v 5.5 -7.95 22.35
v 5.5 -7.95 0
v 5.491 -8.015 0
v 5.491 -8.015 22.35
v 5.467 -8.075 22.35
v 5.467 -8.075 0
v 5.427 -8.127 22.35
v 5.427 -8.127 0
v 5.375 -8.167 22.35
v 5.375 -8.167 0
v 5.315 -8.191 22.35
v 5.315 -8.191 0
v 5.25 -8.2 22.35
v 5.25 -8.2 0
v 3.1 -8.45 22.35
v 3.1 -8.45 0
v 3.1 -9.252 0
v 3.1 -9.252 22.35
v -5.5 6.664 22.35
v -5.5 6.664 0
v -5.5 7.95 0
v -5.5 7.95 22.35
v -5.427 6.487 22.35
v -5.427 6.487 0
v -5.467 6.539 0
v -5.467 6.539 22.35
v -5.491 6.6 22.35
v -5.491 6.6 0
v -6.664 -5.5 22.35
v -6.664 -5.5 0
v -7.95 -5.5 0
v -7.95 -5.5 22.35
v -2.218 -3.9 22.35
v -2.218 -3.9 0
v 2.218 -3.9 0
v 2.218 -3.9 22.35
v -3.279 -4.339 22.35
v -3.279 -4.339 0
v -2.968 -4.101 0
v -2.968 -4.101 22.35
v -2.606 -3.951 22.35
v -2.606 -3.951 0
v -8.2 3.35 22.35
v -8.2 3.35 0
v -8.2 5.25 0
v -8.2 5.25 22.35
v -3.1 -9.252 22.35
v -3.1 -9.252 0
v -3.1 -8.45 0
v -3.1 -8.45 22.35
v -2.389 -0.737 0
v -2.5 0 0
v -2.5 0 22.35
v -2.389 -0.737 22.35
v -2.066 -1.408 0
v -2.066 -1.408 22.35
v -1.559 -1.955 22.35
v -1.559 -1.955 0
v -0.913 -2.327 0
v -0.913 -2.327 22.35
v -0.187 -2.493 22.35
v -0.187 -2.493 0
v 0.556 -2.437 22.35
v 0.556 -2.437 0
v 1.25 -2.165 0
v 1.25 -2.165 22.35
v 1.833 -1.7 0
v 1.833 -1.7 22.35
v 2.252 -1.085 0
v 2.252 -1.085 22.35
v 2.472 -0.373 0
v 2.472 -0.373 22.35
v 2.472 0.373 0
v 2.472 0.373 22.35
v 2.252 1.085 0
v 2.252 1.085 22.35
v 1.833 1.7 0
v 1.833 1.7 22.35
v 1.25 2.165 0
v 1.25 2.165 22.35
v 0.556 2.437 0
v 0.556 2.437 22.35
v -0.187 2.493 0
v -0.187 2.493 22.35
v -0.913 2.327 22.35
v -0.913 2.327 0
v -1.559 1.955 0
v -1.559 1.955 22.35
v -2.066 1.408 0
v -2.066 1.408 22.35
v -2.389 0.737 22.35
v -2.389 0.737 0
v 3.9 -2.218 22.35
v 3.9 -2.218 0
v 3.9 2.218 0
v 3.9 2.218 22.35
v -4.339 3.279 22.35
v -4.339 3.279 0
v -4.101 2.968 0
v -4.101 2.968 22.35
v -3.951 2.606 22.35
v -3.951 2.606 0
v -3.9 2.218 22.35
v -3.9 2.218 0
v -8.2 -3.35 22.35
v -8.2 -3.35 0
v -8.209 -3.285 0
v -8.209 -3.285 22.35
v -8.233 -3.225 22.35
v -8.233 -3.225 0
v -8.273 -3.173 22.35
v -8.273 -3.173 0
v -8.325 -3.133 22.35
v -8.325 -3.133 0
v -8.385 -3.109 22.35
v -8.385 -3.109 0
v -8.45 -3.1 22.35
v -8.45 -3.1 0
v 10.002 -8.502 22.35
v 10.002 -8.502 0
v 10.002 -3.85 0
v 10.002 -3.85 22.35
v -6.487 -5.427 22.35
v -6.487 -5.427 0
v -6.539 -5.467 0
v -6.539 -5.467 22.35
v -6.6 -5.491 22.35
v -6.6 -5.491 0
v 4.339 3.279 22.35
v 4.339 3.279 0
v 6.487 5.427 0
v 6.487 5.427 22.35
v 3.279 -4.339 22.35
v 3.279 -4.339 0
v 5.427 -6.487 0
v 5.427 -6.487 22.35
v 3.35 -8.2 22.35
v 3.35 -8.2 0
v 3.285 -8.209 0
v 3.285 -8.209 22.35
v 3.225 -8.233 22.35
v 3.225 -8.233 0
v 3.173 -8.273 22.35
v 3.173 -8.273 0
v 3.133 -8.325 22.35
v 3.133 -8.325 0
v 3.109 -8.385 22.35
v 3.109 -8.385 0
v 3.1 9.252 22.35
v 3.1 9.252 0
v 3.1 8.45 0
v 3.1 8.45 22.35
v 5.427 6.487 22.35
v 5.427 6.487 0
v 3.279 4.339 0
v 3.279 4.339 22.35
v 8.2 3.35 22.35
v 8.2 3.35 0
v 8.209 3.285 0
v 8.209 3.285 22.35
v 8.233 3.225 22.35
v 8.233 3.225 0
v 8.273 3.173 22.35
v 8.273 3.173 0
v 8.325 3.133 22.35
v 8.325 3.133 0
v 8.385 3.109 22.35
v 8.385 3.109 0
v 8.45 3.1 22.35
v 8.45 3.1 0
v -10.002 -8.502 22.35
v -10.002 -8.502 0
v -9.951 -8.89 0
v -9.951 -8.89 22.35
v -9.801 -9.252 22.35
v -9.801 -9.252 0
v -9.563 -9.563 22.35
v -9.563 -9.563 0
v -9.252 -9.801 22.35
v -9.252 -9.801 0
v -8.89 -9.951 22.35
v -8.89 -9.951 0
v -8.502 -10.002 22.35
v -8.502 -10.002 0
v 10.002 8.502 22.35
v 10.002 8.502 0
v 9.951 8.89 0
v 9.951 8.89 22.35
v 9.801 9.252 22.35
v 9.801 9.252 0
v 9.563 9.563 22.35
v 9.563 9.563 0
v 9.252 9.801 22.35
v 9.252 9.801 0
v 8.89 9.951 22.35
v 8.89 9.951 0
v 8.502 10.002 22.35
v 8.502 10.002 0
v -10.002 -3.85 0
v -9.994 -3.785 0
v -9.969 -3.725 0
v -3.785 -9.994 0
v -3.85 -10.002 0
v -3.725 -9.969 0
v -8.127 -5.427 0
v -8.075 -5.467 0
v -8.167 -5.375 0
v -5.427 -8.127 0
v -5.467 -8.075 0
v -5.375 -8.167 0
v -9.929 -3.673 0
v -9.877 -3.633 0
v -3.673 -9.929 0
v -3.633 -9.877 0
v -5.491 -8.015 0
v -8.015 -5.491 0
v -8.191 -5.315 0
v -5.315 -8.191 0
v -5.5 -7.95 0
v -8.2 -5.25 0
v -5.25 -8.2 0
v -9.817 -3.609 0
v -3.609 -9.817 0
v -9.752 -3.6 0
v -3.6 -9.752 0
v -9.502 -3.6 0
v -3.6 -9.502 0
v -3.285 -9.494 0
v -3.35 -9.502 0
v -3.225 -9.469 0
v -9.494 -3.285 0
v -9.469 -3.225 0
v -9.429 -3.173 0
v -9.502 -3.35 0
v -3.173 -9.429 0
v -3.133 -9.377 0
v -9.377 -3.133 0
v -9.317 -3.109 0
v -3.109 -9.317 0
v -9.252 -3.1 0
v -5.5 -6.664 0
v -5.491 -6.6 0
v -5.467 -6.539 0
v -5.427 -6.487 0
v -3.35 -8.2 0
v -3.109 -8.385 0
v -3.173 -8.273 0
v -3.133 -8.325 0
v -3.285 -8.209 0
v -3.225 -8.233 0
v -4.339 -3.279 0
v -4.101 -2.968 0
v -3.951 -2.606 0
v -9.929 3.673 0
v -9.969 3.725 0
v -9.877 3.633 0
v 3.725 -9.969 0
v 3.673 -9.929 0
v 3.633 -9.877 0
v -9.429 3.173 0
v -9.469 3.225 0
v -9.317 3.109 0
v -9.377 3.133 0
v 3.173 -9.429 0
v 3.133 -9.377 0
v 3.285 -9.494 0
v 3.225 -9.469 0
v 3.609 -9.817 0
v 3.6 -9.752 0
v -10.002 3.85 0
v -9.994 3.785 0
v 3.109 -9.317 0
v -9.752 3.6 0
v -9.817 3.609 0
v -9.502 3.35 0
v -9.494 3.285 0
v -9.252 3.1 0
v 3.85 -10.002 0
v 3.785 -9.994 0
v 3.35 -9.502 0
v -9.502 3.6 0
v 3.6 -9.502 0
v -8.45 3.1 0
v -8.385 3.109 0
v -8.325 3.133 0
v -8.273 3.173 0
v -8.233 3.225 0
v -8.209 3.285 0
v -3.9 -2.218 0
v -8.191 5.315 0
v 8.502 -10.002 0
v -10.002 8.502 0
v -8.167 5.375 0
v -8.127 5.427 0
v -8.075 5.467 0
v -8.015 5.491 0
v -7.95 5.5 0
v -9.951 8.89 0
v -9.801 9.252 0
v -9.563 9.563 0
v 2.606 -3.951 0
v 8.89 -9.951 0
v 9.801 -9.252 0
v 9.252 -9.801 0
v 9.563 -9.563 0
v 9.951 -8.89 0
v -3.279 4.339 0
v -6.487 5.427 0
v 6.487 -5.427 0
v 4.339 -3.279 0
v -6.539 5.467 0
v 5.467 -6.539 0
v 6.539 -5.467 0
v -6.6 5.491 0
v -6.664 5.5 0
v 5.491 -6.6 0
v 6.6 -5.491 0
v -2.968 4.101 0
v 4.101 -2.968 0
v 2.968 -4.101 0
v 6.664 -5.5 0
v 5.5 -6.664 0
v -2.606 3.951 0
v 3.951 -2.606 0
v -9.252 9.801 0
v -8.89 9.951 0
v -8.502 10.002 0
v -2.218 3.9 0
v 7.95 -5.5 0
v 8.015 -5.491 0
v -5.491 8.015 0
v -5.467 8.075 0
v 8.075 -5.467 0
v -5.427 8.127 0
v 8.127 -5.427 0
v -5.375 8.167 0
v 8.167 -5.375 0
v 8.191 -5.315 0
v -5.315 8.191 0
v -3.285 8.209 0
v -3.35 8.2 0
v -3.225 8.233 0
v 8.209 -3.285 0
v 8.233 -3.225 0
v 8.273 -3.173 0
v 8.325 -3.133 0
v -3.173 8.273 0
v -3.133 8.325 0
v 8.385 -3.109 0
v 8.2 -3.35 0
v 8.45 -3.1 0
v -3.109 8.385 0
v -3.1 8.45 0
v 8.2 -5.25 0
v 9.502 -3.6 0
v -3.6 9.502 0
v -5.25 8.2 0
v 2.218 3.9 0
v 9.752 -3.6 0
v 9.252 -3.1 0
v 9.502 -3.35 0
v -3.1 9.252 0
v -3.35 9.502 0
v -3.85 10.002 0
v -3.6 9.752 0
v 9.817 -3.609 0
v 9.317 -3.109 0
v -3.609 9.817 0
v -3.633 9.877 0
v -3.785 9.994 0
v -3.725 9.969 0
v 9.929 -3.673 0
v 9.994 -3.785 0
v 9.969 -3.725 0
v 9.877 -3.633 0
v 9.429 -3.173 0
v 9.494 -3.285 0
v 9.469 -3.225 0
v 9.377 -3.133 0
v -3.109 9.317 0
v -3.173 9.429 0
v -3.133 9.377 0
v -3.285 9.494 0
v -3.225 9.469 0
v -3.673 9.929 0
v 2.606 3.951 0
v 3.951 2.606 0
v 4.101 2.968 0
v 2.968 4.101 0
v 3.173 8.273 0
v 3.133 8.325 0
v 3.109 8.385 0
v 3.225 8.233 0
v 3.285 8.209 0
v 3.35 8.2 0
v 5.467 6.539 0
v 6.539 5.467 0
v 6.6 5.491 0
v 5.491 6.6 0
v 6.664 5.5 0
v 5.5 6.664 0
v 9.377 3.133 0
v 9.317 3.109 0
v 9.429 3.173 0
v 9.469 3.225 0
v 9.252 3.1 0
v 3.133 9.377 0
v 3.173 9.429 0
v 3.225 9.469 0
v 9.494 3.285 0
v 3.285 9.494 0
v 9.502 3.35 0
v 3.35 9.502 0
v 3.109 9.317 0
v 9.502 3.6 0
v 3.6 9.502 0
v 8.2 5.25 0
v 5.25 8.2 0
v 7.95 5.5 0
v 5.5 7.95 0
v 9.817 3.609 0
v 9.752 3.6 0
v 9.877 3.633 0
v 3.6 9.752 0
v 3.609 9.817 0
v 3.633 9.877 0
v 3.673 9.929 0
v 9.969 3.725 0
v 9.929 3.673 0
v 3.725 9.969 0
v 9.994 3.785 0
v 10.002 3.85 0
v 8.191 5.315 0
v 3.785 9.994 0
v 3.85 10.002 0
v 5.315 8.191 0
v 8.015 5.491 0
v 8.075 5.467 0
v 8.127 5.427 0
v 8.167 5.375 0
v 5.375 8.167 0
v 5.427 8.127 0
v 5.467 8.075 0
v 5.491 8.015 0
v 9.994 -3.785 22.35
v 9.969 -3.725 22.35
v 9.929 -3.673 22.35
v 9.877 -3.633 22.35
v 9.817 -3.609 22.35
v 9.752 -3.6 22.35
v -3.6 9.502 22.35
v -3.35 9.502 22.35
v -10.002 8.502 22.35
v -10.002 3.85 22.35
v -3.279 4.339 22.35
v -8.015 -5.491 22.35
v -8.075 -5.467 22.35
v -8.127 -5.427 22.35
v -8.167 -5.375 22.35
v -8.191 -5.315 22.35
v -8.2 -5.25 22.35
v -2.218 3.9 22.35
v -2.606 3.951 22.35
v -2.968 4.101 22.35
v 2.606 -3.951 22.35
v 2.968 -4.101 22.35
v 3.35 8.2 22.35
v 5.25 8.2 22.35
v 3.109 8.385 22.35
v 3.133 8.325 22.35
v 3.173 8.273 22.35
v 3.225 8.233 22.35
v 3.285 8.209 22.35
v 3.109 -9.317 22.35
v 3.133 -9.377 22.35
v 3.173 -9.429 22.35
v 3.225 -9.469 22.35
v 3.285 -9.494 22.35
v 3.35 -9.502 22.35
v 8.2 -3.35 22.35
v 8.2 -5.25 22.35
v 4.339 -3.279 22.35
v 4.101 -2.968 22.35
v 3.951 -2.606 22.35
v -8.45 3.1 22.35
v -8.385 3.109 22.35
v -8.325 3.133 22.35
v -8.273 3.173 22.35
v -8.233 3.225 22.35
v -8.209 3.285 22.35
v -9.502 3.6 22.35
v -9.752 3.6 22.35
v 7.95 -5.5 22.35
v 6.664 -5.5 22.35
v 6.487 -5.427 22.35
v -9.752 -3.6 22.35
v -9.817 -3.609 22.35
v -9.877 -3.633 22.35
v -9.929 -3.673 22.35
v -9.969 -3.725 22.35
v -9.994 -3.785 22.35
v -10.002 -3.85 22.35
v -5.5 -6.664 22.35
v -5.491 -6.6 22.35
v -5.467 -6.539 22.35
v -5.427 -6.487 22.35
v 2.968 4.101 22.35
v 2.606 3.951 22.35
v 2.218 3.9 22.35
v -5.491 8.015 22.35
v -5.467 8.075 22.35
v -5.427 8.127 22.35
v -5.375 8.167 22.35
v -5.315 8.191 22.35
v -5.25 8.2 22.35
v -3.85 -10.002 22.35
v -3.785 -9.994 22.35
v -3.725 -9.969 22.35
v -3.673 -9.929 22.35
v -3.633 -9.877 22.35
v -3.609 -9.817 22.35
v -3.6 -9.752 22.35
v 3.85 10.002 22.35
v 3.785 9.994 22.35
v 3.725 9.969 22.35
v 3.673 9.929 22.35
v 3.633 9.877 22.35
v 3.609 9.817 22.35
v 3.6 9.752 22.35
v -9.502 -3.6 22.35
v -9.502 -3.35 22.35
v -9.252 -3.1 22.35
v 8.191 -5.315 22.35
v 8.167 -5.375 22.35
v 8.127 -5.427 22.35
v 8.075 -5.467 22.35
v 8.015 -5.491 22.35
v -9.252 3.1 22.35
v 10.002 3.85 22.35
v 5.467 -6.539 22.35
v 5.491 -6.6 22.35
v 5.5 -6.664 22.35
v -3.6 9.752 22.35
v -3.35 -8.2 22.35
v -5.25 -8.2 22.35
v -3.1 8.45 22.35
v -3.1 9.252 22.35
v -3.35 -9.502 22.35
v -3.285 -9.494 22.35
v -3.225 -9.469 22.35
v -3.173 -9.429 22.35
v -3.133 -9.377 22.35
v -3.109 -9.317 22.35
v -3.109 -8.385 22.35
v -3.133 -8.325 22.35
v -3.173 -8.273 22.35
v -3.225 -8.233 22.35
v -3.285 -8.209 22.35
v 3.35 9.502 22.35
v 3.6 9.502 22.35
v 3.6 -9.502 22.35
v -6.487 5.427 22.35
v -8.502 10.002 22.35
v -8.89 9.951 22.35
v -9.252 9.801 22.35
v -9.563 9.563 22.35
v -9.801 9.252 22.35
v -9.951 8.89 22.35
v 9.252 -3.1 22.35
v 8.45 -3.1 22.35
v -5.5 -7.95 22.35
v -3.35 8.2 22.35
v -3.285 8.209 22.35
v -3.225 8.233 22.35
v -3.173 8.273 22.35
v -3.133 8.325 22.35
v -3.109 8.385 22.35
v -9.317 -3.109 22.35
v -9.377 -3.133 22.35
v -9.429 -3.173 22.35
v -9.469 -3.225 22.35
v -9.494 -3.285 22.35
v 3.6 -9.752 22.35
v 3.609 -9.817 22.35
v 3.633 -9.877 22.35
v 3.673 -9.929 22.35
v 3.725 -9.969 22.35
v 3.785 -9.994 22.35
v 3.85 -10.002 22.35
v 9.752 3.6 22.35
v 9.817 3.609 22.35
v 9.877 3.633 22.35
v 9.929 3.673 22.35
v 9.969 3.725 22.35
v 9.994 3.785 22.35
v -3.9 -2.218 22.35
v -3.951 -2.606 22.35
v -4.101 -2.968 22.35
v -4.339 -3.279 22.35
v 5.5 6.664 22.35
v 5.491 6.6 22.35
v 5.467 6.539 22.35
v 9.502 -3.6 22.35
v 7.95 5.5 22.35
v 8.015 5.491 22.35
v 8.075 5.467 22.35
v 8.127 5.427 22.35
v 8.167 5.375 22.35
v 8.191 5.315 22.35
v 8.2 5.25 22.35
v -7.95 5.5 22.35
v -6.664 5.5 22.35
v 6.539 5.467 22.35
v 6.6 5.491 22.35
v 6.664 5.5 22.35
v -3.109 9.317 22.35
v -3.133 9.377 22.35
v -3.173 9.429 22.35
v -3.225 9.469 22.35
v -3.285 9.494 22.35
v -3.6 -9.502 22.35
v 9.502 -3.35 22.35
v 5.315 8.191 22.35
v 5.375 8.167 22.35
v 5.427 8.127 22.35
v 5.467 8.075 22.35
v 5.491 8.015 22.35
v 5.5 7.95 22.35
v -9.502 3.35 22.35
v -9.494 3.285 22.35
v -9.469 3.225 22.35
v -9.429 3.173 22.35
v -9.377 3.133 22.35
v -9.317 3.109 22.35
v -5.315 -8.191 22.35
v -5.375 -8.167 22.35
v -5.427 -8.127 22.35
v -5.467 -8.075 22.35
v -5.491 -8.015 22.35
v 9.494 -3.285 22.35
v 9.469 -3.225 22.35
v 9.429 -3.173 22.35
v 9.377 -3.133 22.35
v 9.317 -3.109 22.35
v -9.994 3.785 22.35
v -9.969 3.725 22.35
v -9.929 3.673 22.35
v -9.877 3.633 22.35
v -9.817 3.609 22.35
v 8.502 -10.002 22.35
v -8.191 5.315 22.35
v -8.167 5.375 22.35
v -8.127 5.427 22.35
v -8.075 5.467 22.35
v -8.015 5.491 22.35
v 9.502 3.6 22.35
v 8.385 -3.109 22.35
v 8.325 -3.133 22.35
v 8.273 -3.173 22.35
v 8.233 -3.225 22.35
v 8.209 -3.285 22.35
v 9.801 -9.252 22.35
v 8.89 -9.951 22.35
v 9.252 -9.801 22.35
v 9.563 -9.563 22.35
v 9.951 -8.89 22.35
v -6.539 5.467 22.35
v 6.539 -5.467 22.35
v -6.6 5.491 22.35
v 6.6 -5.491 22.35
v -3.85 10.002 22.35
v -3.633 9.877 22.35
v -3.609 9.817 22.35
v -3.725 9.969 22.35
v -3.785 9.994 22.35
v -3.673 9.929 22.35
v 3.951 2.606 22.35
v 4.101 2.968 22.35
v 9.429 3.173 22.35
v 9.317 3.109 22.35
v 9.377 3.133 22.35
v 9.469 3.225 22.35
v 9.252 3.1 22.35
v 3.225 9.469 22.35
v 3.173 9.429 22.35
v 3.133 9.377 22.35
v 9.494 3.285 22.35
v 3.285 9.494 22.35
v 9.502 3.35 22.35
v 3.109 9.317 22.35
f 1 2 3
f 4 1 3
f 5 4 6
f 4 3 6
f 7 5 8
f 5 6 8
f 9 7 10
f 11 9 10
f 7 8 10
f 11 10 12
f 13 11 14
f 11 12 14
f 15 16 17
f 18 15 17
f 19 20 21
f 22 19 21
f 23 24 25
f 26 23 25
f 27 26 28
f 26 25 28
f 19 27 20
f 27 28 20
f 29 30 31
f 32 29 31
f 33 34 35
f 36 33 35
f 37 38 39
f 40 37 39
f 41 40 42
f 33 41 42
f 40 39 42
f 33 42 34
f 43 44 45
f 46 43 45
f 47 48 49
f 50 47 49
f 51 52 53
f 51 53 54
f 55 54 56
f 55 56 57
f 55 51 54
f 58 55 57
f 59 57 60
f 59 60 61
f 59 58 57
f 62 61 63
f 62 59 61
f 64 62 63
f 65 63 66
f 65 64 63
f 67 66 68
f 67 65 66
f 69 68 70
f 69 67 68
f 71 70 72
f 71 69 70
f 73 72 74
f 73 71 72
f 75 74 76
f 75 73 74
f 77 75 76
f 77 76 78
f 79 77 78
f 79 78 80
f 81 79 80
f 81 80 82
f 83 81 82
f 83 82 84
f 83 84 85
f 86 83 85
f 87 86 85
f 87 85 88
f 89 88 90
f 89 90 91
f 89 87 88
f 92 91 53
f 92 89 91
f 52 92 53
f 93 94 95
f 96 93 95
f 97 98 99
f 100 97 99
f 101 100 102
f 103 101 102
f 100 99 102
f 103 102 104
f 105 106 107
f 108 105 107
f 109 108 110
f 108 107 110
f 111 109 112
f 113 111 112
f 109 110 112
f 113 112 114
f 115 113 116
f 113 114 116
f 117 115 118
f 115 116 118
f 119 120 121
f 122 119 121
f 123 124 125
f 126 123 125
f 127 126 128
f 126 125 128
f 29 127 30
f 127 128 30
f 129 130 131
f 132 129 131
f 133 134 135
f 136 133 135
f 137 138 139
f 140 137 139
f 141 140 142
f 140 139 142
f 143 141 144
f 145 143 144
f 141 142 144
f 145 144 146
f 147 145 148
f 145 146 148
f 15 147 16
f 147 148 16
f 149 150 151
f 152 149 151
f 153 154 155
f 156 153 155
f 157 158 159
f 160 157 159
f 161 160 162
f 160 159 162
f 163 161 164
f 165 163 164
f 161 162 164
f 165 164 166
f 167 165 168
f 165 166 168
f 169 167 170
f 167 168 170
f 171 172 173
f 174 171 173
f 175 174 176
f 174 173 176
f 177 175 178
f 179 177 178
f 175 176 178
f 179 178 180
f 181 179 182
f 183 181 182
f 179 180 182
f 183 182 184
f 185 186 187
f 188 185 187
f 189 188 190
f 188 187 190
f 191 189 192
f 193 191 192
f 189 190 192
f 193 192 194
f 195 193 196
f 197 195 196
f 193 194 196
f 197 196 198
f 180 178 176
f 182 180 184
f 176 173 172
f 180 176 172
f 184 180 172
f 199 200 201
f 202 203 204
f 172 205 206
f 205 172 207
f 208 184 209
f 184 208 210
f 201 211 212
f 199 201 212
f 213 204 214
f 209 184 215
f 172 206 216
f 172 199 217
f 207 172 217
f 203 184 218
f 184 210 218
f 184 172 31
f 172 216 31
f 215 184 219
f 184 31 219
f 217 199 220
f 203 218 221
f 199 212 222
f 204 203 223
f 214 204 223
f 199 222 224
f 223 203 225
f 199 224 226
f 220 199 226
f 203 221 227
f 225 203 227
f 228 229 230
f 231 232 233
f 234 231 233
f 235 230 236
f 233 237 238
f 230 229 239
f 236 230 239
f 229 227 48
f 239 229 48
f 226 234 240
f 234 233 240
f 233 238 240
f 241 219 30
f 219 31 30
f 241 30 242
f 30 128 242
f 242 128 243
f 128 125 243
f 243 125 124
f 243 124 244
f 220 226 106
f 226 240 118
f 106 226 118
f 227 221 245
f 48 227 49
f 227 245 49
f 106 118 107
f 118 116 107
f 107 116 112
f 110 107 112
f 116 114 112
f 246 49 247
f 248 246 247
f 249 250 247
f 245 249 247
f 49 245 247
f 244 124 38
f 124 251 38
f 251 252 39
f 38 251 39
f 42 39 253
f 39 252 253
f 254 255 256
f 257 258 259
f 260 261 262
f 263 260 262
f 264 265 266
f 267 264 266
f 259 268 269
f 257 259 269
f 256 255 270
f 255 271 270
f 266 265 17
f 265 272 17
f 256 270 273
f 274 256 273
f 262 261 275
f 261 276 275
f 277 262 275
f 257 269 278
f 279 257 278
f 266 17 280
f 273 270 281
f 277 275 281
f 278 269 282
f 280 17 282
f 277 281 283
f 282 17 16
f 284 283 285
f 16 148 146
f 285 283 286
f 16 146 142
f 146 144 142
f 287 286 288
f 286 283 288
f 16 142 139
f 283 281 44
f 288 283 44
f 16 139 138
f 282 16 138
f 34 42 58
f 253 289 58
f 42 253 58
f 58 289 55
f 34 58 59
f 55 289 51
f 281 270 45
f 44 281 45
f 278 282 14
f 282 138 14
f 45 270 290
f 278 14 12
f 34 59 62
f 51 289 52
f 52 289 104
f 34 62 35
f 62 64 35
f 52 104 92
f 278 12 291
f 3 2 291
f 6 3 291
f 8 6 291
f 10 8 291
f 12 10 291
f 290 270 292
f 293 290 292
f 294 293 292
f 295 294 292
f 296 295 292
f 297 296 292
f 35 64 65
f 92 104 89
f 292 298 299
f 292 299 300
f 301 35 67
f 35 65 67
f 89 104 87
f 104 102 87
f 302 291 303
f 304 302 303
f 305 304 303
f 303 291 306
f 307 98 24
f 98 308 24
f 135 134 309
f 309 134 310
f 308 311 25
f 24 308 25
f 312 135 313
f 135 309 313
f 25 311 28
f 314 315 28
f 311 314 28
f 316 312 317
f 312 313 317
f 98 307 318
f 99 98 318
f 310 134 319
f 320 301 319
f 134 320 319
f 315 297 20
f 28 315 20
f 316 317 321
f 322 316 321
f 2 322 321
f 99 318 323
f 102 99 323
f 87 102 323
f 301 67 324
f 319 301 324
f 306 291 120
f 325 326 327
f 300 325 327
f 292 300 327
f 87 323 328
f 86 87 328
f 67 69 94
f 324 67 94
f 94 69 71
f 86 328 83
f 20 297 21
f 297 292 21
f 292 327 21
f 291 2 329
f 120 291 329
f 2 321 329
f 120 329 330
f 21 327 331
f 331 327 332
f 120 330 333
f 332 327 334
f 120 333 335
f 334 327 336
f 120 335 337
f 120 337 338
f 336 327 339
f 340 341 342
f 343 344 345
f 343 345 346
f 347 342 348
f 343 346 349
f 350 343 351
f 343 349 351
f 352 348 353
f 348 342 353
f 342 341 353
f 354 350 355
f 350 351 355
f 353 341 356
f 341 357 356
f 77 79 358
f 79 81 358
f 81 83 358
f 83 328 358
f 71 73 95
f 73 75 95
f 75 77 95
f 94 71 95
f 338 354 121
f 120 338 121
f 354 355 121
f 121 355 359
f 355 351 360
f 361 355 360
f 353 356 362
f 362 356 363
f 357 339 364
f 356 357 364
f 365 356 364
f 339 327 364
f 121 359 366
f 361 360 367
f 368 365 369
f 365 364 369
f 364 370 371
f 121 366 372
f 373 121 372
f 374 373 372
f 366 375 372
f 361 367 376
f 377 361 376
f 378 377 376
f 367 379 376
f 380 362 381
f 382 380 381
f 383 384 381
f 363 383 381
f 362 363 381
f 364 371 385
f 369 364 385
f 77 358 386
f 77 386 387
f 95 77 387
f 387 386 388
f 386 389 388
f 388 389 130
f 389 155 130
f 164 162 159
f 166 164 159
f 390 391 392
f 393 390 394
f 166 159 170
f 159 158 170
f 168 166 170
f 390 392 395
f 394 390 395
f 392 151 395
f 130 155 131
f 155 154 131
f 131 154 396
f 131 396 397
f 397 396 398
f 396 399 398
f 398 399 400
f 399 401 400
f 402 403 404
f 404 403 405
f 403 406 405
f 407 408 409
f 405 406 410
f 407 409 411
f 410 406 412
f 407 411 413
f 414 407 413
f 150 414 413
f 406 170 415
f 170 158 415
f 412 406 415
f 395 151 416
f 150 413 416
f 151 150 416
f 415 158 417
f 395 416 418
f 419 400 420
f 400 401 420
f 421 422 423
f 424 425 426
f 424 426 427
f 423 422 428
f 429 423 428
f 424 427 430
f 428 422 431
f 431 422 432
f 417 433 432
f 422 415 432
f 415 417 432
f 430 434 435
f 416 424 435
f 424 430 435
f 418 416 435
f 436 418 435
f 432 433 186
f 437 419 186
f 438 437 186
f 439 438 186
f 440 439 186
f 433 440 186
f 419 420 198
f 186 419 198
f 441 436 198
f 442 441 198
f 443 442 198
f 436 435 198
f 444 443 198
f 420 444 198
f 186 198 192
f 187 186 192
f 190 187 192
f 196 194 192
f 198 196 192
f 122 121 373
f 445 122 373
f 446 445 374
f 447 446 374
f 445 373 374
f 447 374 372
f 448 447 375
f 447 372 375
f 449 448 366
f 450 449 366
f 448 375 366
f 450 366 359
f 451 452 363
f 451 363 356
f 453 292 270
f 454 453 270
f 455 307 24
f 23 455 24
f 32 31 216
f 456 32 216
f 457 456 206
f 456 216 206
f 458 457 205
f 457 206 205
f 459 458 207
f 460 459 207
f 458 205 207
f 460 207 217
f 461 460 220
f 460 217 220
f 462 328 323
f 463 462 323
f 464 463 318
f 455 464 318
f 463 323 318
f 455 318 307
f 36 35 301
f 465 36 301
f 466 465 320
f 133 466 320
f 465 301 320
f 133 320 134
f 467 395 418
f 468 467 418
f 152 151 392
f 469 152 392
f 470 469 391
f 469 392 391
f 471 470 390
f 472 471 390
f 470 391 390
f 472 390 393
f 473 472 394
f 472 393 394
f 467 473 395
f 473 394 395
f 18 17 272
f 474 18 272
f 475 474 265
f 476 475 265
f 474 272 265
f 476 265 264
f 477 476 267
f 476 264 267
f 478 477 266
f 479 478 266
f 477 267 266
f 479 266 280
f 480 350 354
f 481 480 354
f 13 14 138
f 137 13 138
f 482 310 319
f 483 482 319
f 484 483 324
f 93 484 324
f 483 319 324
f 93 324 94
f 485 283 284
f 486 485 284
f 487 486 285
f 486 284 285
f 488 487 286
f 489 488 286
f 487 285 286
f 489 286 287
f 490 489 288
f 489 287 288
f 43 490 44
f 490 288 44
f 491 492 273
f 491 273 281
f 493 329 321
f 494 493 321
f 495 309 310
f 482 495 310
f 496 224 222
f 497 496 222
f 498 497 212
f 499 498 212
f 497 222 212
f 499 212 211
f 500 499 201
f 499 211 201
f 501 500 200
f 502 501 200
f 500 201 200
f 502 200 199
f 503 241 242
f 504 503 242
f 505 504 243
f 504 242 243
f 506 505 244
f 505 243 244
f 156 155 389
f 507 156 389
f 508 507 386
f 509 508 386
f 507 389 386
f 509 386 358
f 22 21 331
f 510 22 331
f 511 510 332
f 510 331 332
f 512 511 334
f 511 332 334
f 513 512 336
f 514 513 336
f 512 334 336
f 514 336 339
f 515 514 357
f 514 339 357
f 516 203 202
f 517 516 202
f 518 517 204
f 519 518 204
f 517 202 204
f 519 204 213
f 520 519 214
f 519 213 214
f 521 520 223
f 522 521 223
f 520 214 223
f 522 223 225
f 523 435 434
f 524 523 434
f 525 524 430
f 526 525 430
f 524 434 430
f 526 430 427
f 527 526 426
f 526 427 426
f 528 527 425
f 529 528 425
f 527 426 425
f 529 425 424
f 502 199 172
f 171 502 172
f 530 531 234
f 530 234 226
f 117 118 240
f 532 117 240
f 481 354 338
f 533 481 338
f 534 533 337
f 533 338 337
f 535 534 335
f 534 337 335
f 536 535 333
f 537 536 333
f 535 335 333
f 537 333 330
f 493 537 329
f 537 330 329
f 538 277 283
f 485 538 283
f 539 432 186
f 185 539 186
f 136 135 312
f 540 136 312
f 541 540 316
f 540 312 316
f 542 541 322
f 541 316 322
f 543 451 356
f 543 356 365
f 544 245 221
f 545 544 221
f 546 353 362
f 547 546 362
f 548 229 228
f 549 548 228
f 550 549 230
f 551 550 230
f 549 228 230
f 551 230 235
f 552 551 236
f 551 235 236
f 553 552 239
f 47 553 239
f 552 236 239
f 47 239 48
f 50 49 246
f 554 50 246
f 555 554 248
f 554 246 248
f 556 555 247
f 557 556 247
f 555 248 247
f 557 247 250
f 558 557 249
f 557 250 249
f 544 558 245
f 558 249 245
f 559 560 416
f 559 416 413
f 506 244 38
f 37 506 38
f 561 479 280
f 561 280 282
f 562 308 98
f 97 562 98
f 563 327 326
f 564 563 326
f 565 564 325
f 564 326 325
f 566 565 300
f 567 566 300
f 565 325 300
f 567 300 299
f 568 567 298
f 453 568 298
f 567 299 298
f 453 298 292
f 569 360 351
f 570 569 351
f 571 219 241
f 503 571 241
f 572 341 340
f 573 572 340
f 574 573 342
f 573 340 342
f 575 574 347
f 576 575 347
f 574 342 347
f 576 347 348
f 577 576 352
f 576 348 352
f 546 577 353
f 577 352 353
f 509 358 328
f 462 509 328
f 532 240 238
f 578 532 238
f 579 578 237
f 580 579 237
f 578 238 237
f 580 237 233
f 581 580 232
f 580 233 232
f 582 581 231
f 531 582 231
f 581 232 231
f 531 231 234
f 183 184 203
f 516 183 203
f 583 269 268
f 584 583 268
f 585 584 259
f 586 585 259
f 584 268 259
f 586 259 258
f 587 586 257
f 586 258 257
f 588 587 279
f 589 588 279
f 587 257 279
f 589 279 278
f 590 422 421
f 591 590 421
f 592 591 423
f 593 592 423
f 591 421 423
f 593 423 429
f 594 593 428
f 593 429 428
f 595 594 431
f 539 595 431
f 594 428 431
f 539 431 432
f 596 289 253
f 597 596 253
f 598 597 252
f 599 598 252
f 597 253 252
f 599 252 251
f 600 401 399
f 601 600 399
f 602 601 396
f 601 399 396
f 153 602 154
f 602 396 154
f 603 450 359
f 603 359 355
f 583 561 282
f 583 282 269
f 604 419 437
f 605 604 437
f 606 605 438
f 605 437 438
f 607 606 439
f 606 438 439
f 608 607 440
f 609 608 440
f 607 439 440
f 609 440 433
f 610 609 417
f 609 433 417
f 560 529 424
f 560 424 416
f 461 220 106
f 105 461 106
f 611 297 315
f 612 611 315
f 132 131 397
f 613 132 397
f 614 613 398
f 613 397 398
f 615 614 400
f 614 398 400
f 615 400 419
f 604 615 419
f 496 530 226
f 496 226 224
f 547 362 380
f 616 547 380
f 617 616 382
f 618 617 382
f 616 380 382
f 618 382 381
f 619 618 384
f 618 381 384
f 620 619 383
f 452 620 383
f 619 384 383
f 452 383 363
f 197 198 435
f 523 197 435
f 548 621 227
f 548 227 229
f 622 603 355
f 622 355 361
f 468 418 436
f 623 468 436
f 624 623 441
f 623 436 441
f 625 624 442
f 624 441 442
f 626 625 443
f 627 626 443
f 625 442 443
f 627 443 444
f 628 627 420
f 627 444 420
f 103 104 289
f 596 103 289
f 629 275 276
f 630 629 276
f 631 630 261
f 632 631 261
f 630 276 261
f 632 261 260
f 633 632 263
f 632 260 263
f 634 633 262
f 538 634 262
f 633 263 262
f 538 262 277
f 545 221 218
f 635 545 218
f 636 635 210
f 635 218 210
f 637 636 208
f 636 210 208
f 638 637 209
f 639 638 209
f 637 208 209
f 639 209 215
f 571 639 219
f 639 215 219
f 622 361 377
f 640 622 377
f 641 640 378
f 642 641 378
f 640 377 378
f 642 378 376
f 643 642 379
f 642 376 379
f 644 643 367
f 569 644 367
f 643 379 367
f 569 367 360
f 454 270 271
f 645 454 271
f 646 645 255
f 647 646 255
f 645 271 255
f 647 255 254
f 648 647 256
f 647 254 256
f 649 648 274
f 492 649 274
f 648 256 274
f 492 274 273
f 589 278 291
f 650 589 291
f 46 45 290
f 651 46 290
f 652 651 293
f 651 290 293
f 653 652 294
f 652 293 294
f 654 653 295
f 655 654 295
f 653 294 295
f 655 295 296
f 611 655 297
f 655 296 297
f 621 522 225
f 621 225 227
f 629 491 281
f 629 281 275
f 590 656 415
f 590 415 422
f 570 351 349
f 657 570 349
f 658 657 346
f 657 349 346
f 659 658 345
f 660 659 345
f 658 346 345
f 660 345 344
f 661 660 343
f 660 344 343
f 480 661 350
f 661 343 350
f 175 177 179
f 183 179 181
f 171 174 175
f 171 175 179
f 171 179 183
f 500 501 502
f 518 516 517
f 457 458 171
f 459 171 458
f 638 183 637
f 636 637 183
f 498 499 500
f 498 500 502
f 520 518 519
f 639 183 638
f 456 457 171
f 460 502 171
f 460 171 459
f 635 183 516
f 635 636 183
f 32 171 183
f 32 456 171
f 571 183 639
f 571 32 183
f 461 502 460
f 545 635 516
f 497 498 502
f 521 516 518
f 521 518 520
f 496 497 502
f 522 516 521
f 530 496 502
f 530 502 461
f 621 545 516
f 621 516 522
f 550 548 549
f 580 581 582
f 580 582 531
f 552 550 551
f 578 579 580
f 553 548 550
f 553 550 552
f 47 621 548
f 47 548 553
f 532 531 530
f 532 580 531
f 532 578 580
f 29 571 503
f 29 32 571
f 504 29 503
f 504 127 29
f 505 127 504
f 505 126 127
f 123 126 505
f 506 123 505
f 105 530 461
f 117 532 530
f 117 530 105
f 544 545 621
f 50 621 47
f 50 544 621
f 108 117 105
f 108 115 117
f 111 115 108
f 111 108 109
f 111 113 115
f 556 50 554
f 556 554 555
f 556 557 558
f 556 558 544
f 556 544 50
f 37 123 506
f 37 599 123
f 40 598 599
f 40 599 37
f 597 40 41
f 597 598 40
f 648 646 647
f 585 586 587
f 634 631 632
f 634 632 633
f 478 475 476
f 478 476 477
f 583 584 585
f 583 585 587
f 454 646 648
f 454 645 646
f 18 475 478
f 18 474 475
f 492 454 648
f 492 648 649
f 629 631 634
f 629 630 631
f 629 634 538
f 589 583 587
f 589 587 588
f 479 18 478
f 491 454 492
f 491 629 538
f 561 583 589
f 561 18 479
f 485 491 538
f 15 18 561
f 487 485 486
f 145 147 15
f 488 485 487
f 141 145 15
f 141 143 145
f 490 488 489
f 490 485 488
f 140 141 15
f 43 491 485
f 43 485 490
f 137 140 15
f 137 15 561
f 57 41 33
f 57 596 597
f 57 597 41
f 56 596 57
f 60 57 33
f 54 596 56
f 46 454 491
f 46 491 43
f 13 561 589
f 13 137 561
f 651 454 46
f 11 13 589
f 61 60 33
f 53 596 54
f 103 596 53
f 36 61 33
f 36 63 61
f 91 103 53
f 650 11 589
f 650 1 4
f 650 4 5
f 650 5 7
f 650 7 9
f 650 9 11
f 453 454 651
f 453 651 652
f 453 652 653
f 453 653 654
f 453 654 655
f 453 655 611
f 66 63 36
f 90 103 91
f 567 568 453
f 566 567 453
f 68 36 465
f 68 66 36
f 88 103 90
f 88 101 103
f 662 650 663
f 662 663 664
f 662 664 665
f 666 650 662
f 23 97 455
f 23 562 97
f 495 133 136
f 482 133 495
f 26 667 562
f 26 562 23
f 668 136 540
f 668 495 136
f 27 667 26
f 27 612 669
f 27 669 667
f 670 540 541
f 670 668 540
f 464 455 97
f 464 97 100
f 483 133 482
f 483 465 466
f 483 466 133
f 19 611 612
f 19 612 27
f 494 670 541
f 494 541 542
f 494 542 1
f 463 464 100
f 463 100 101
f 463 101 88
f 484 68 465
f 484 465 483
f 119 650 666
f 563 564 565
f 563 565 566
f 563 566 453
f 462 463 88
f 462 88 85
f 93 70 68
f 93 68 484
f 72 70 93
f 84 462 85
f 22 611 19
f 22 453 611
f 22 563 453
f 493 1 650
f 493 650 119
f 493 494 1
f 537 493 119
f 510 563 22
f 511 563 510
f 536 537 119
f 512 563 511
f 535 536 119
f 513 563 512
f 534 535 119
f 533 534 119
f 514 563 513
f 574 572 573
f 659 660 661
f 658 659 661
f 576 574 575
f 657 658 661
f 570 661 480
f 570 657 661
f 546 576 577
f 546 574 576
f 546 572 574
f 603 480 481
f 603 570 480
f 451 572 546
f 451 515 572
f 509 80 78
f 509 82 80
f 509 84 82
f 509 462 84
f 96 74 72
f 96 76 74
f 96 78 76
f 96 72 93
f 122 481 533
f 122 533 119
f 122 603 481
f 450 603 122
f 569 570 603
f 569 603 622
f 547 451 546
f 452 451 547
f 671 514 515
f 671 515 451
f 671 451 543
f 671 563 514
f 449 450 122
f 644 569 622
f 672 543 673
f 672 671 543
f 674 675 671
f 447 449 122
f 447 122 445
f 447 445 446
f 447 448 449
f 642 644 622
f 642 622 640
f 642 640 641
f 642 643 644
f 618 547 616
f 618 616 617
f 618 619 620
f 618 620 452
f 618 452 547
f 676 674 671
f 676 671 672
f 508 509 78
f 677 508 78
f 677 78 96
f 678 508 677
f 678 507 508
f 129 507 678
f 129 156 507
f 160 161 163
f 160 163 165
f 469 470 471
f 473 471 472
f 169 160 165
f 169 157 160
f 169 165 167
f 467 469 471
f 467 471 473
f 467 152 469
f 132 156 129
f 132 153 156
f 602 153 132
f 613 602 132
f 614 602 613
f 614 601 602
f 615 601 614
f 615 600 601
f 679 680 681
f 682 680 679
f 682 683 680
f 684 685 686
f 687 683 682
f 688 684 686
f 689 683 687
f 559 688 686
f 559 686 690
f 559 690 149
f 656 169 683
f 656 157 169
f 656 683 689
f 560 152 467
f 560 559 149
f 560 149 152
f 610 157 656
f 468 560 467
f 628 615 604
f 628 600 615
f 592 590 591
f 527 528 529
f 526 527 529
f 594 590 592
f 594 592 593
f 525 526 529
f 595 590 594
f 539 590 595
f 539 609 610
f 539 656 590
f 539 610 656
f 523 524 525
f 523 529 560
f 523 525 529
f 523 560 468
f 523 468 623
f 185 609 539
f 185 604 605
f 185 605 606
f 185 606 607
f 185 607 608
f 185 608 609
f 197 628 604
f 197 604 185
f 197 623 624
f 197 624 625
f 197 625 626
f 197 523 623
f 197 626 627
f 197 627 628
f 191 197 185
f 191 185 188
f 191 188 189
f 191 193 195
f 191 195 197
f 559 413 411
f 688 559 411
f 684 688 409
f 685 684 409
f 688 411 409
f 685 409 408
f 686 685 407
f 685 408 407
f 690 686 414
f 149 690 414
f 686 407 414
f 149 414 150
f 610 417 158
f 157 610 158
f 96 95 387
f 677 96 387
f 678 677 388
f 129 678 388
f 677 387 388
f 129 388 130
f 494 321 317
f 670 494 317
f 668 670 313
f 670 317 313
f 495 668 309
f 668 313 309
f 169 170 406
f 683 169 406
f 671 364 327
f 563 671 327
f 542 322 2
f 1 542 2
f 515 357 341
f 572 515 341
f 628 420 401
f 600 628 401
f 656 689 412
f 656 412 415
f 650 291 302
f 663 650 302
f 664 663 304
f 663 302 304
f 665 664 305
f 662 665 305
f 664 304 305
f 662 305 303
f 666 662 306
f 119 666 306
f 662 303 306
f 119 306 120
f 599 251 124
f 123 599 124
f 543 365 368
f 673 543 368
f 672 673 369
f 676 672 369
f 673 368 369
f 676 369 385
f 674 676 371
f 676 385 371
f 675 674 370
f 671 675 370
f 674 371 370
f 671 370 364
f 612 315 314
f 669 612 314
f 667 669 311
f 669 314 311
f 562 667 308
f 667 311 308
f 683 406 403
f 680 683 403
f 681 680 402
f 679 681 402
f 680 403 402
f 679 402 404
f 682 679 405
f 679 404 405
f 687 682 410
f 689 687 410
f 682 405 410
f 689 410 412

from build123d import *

# Parameters (mm, degrees)
SKETCH_1_R      = 2.5
EXTRUDE_1_DEPTH = 22.35


with BuildPart() as part:
    # 草图1 → 凸台-拉伸1 (new body)
    with BuildSketch(Plane.XY):
        with BuildLine():
            Line((-8.502261885, -10.002261885), (-3.85, -10.002261885))
            ThreePointArc((-3.85, -10.002261885), (-3.673223305, -9.929038581), (-3.6, -9.752261885))
            Line((-3.6, -9.752261885), (-3.6, -9.502261885))
            Line((-3.6, -9.502261885), (-3.35, -9.502261885))
            ThreePointArc((-3.35, -9.502261885), (-3.173223305, -9.429038581), (-3.1, -9.252261885))
            Line((-3.1, -9.252261885), (-3.1, -8.45))
            ThreePointArc((-3.1, -8.45), (-3.173223305, -8.273223305), (-3.35, -8.2))
            Line((-3.35, -8.2), (-5.25, -8.2))
            ThreePointArc((-5.25, -8.2), (-5.426776695, -8.126776695), (-5.5, -7.95))
            Line((-5.5, -7.95), (-5.5, -6.664213562))
            ThreePointArc((-5.5, -6.664213562), (-5.480969883, -6.568542704), (-5.426776695, -6.487436867))
            Line((-5.426776695, -6.487436867), (-3.278679656, -4.339339828))
            ThreePointArc((-3.278679656, -4.339339828), (-2.792044633, -4.014180701), (-2.218019485, -3.9))
            Line((-2.218019485, -3.9), (2.218019485, -3.9))
            ThreePointArc((2.218019485, -3.9), (2.792044633, -4.014180701), (3.278679656, -4.339339828))
            Line((3.278679656, -4.339339828), (5.426776695, -6.487436867))
            ThreePointArc((5.426776695, -6.487436867), (5.480969883, -6.568542704), (5.5, -6.664213562))
            Line((5.5, -6.664213562), (5.5, -7.95))
            ThreePointArc((5.5, -7.95), (5.426776695, -8.126776695), (5.25, -8.2))
            Line((5.25, -8.2), (3.35, -8.2))
            ThreePointArc((3.35, -8.2), (3.173223305, -8.273223305), (3.1, -8.45))
            Line((3.1, -8.45), (3.1, -9.252261885))
            ThreePointArc((3.1, -9.252261885), (3.173223305, -9.429038581), (3.35, -9.502261885))
            Line((3.35, -9.502261885), (3.6, -9.502261885))
            Line((3.6, -9.502261885), (3.6, -9.752261885))
            ThreePointArc((3.6, -9.752261885), (3.673223305, -9.929038581), (3.85, -10.002261885))
            Line((3.85, -10.002261885), (8.502261885, -10.002261885))
            ThreePointArc((8.502261885, -10.002261885), (9.562922057, -9.562922057), (10.002261885, -8.502261885))
            Line((10.002261885, -8.502261885), (10.002261885, -3.85))
            ThreePointArc((10.002261885, -3.85), (9.929038581, -3.673223305), (9.752261885, -3.6))
            Line((9.752261885, -3.6), (9.502261885, -3.6))
            Line((9.502261885, -3.6), (9.502261885, -3.35))
            ThreePointArc((9.502261885, -3.35), (9.429038581, -3.173223305), (9.252261885, -3.1))
            Line((9.252261885, -3.1), (8.45, -3.1))
            ThreePointArc((8.45, -3.1), (8.273223305, -3.173223305), (8.2, -3.35))
            Line((8.2, -3.35), (8.2, -5.25))
            ThreePointArc((8.2, -5.25), (8.126776695, -5.426776695), (7.95, -5.5))
            Line((7.95, -5.5), (6.664213562, -5.5))
            ThreePointArc((6.664213562, -5.5), (6.568542704, -5.480969883), (6.487436867, -5.426776695))
            Line((6.487436867, -5.426776695), (4.339339828, -3.278679656))
            ThreePointArc((4.339339828, -3.278679656), (4.014180701, -2.792044633), (3.9, -2.218019485))
            Line((3.9, -2.218019485), (3.9, 2.218019485))
            ThreePointArc((3.9, 2.218019485), (4.014180701, 2.792044633), (4.339339828, 3.278679656))
            Line((4.339339828, 3.278679656), (6.487436867, 5.426776695))
            ThreePointArc((6.487436867, 5.426776695), (6.568542704, 5.480969883), (6.664213562, 5.5))
            Line((6.664213562, 5.5), (7.95, 5.5))
            ThreePointArc((7.95, 5.5), (8.126776695, 5.426776695), (8.2, 5.25))
            Line((8.2, 5.25), (8.2, 3.35))
            ThreePointArc((8.2, 3.35), (8.273223305, 3.173223305), (8.45, 3.1))
            Line((8.45, 3.1), (9.252261885, 3.1))
            ThreePointArc((9.252261885, 3.1), (9.429038581, 3.173223305), (9.502261885, 3.35))
            Line((9.502261885, 3.35), (9.502261885, 3.6))
            Line((9.502261885, 3.6), (9.752261885, 3.6))
            ThreePointArc((9.752261885, 3.6), (9.929038581, 3.673223305), (10.002261885, 3.85))
            Line((10.002261885, 3.85), (10.002261885, 8.502261885))
            ThreePointArc((10.002261885, 8.502261885), (9.562922057, 9.562922057), (8.502261885, 10.002261885))
            Line((8.502261885, 10.002261885), (3.85, 10.002261885))
            ThreePointArc((3.85, 10.002261885), (3.673223305, 9.929038581), (3.6, 9.752261885))
            Line((3.6, 9.752261885), (3.6, 9.502261885))
            Line((3.6, 9.502261885), (3.35, 9.502261885))
            ThreePointArc((3.35, 9.502261885), (3.173223305, 9.429038581), (3.1, 9.252261885))
            Line((3.1, 9.252261885), (3.1, 8.45))
            ThreePointArc((3.1, 8.45), (3.173223305, 8.273223305), (3.35, 8.2))
            Line((3.35, 8.2), (5.25, 8.2))
            ThreePointArc((5.25, 8.2), (5.426776695, 8.126776695), (5.5, 7.95))
            Line((5.5, 7.95), (5.5, 6.664213562))
            ThreePointArc((5.5, 6.664213562), (5.480969883, 6.568542704), (5.426776695, 6.487436867))
            Line((5.426776695, 6.487436867), (3.278679656, 4.339339828))
            ThreePointArc((3.278679656, 4.339339828), (2.792044633, 4.014180701), (2.218019485, 3.9))
            Line((2.218019485, 3.9), (-2.218019485, 3.9))
            ThreePointArc((-2.218019485, 3.9), (-2.792044633, 4.014180701), (-3.278679656, 4.339339828))
            Line((-3.278679656, 4.339339828), (-5.426776695, 6.487436867))
            ThreePointArc((-5.426776695, 6.487436867), (-5.480969883, 6.568542704), (-5.5, 6.664213562))
            Line((-5.5, 6.664213562), (-5.5, 7.95))
            ThreePointArc((-5.5, 7.95), (-5.426776695, 8.126776695), (-5.25, 8.2))
            Line((-5.25, 8.2), (-3.35, 8.2))
            ThreePointArc((-3.35, 8.2), (-3.173223305, 8.273223305), (-3.1, 8.45))
            Line((-3.1, 8.45), (-3.1, 9.252261885))
            ThreePointArc((-3.1, 9.252261885), (-3.173223305, 9.429038581), (-3.35, 9.502261885))
            Line((-3.35, 9.502261885), (-3.6, 9.502261885))
            Line((-3.6, 9.502261885), (-3.6, 9.752261885))
            ThreePointArc((-3.6, 9.752261885), (-3.673223305, 9.929038581), (-3.85, 10.002261885))
            Line((-3.85, 10.002261885), (-8.502261885, 10.002261885))
            ThreePointArc((-8.502261885, 10.002261885), (-9.562922057, 9.562922057), (-10.002261885, 8.502261885))
            Line((-10.002261885, 8.502261885), (-10.002261885, 3.85))
            ThreePointArc((-10.002261885, 3.85), (-9.929038581, 3.673223305), (-9.752261885, 3.6))
            Line((-9.752261885, 3.6), (-9.502261885, 3.6))
            Line((-9.502261885, 3.6), (-9.502261885, 3.35))
            ThreePointArc((-9.502261885, 3.35), (-9.429038581, 3.173223305), (-9.252261885, 3.1))
            Line((-9.252261885, 3.1), (-8.45, 3.1))
            ThreePointArc((-8.45, 3.1), (-8.273223305, 3.173223305), (-8.2, 3.35))
            Line((-8.2, 3.35), (-8.2, 5.25))
            ThreePointArc((-8.2, 5.25), (-8.126776695, 5.426776695), (-7.95, 5.5))
            Line((-7.95, 5.5), (-6.664213562, 5.5))
            ThreePointArc((-6.664213562, 5.5), (-6.568542704, 5.480969883), (-6.487436867, 5.426776695))
            Line((-6.487436867, 5.426776695), (-4.339339828, 3.278679656))
            ThreePointArc((-4.339339828, 3.278679656), (-4.014180701, 2.792044633), (-3.9, 2.218019485))
            Line((-3.9, 2.218019485), (-3.9, -2.218019485))
            ThreePointArc((-3.9, -2.218019485), (-4.014180701, -2.792044633), (-4.339339828, -3.278679656))
            Line((-4.339339828, -3.278679656), (-6.487436867, -5.426776695))
            ThreePointArc((-6.487436867, -5.426776695), (-6.568542704, -5.480969883), (-6.664213562, -5.5))
            Line((-6.664213562, -5.5), (-7.95, -5.5))
            ThreePointArc((-7.95, -5.5), (-8.126776695, -5.426776695), (-8.2, -5.25))
            Line((-8.2, -5.25), (-8.2, -3.35))
            ThreePointArc((-8.2, -3.35), (-8.273223305, -3.173223305), (-8.45, -3.1))
            Line((-8.45, -3.1), (-9.252261885, -3.1))
            ThreePointArc((-9.252261885, -3.1), (-9.429038581, -3.173223305), (-9.502261885, -3.35))
            Line((-9.502261885, -3.35), (-9.502261885, -3.6))
            Line((-9.502261885, -3.6), (-9.752261885, -3.6))
            ThreePointArc((-9.752261885, -3.6), (-9.929038581, -3.673223305), (-10.002261885, -3.85))
            Line((-10.002261885, -3.85), (-10.002261885, -8.502261885))
            ThreePointArc((-10.002261885, -8.502261885), (-9.562922057, -9.562922057), (-8.502261885, -10.002261885))
        make_face()
        with Locations(Location((0, 0, 0), (0, 0, 180))):
            Circle(SKETCH_1_R, mode=Mode.SUBTRACT)
    extrude(amount=EXTRUDE_1_DEPTH)


solid = part.part
